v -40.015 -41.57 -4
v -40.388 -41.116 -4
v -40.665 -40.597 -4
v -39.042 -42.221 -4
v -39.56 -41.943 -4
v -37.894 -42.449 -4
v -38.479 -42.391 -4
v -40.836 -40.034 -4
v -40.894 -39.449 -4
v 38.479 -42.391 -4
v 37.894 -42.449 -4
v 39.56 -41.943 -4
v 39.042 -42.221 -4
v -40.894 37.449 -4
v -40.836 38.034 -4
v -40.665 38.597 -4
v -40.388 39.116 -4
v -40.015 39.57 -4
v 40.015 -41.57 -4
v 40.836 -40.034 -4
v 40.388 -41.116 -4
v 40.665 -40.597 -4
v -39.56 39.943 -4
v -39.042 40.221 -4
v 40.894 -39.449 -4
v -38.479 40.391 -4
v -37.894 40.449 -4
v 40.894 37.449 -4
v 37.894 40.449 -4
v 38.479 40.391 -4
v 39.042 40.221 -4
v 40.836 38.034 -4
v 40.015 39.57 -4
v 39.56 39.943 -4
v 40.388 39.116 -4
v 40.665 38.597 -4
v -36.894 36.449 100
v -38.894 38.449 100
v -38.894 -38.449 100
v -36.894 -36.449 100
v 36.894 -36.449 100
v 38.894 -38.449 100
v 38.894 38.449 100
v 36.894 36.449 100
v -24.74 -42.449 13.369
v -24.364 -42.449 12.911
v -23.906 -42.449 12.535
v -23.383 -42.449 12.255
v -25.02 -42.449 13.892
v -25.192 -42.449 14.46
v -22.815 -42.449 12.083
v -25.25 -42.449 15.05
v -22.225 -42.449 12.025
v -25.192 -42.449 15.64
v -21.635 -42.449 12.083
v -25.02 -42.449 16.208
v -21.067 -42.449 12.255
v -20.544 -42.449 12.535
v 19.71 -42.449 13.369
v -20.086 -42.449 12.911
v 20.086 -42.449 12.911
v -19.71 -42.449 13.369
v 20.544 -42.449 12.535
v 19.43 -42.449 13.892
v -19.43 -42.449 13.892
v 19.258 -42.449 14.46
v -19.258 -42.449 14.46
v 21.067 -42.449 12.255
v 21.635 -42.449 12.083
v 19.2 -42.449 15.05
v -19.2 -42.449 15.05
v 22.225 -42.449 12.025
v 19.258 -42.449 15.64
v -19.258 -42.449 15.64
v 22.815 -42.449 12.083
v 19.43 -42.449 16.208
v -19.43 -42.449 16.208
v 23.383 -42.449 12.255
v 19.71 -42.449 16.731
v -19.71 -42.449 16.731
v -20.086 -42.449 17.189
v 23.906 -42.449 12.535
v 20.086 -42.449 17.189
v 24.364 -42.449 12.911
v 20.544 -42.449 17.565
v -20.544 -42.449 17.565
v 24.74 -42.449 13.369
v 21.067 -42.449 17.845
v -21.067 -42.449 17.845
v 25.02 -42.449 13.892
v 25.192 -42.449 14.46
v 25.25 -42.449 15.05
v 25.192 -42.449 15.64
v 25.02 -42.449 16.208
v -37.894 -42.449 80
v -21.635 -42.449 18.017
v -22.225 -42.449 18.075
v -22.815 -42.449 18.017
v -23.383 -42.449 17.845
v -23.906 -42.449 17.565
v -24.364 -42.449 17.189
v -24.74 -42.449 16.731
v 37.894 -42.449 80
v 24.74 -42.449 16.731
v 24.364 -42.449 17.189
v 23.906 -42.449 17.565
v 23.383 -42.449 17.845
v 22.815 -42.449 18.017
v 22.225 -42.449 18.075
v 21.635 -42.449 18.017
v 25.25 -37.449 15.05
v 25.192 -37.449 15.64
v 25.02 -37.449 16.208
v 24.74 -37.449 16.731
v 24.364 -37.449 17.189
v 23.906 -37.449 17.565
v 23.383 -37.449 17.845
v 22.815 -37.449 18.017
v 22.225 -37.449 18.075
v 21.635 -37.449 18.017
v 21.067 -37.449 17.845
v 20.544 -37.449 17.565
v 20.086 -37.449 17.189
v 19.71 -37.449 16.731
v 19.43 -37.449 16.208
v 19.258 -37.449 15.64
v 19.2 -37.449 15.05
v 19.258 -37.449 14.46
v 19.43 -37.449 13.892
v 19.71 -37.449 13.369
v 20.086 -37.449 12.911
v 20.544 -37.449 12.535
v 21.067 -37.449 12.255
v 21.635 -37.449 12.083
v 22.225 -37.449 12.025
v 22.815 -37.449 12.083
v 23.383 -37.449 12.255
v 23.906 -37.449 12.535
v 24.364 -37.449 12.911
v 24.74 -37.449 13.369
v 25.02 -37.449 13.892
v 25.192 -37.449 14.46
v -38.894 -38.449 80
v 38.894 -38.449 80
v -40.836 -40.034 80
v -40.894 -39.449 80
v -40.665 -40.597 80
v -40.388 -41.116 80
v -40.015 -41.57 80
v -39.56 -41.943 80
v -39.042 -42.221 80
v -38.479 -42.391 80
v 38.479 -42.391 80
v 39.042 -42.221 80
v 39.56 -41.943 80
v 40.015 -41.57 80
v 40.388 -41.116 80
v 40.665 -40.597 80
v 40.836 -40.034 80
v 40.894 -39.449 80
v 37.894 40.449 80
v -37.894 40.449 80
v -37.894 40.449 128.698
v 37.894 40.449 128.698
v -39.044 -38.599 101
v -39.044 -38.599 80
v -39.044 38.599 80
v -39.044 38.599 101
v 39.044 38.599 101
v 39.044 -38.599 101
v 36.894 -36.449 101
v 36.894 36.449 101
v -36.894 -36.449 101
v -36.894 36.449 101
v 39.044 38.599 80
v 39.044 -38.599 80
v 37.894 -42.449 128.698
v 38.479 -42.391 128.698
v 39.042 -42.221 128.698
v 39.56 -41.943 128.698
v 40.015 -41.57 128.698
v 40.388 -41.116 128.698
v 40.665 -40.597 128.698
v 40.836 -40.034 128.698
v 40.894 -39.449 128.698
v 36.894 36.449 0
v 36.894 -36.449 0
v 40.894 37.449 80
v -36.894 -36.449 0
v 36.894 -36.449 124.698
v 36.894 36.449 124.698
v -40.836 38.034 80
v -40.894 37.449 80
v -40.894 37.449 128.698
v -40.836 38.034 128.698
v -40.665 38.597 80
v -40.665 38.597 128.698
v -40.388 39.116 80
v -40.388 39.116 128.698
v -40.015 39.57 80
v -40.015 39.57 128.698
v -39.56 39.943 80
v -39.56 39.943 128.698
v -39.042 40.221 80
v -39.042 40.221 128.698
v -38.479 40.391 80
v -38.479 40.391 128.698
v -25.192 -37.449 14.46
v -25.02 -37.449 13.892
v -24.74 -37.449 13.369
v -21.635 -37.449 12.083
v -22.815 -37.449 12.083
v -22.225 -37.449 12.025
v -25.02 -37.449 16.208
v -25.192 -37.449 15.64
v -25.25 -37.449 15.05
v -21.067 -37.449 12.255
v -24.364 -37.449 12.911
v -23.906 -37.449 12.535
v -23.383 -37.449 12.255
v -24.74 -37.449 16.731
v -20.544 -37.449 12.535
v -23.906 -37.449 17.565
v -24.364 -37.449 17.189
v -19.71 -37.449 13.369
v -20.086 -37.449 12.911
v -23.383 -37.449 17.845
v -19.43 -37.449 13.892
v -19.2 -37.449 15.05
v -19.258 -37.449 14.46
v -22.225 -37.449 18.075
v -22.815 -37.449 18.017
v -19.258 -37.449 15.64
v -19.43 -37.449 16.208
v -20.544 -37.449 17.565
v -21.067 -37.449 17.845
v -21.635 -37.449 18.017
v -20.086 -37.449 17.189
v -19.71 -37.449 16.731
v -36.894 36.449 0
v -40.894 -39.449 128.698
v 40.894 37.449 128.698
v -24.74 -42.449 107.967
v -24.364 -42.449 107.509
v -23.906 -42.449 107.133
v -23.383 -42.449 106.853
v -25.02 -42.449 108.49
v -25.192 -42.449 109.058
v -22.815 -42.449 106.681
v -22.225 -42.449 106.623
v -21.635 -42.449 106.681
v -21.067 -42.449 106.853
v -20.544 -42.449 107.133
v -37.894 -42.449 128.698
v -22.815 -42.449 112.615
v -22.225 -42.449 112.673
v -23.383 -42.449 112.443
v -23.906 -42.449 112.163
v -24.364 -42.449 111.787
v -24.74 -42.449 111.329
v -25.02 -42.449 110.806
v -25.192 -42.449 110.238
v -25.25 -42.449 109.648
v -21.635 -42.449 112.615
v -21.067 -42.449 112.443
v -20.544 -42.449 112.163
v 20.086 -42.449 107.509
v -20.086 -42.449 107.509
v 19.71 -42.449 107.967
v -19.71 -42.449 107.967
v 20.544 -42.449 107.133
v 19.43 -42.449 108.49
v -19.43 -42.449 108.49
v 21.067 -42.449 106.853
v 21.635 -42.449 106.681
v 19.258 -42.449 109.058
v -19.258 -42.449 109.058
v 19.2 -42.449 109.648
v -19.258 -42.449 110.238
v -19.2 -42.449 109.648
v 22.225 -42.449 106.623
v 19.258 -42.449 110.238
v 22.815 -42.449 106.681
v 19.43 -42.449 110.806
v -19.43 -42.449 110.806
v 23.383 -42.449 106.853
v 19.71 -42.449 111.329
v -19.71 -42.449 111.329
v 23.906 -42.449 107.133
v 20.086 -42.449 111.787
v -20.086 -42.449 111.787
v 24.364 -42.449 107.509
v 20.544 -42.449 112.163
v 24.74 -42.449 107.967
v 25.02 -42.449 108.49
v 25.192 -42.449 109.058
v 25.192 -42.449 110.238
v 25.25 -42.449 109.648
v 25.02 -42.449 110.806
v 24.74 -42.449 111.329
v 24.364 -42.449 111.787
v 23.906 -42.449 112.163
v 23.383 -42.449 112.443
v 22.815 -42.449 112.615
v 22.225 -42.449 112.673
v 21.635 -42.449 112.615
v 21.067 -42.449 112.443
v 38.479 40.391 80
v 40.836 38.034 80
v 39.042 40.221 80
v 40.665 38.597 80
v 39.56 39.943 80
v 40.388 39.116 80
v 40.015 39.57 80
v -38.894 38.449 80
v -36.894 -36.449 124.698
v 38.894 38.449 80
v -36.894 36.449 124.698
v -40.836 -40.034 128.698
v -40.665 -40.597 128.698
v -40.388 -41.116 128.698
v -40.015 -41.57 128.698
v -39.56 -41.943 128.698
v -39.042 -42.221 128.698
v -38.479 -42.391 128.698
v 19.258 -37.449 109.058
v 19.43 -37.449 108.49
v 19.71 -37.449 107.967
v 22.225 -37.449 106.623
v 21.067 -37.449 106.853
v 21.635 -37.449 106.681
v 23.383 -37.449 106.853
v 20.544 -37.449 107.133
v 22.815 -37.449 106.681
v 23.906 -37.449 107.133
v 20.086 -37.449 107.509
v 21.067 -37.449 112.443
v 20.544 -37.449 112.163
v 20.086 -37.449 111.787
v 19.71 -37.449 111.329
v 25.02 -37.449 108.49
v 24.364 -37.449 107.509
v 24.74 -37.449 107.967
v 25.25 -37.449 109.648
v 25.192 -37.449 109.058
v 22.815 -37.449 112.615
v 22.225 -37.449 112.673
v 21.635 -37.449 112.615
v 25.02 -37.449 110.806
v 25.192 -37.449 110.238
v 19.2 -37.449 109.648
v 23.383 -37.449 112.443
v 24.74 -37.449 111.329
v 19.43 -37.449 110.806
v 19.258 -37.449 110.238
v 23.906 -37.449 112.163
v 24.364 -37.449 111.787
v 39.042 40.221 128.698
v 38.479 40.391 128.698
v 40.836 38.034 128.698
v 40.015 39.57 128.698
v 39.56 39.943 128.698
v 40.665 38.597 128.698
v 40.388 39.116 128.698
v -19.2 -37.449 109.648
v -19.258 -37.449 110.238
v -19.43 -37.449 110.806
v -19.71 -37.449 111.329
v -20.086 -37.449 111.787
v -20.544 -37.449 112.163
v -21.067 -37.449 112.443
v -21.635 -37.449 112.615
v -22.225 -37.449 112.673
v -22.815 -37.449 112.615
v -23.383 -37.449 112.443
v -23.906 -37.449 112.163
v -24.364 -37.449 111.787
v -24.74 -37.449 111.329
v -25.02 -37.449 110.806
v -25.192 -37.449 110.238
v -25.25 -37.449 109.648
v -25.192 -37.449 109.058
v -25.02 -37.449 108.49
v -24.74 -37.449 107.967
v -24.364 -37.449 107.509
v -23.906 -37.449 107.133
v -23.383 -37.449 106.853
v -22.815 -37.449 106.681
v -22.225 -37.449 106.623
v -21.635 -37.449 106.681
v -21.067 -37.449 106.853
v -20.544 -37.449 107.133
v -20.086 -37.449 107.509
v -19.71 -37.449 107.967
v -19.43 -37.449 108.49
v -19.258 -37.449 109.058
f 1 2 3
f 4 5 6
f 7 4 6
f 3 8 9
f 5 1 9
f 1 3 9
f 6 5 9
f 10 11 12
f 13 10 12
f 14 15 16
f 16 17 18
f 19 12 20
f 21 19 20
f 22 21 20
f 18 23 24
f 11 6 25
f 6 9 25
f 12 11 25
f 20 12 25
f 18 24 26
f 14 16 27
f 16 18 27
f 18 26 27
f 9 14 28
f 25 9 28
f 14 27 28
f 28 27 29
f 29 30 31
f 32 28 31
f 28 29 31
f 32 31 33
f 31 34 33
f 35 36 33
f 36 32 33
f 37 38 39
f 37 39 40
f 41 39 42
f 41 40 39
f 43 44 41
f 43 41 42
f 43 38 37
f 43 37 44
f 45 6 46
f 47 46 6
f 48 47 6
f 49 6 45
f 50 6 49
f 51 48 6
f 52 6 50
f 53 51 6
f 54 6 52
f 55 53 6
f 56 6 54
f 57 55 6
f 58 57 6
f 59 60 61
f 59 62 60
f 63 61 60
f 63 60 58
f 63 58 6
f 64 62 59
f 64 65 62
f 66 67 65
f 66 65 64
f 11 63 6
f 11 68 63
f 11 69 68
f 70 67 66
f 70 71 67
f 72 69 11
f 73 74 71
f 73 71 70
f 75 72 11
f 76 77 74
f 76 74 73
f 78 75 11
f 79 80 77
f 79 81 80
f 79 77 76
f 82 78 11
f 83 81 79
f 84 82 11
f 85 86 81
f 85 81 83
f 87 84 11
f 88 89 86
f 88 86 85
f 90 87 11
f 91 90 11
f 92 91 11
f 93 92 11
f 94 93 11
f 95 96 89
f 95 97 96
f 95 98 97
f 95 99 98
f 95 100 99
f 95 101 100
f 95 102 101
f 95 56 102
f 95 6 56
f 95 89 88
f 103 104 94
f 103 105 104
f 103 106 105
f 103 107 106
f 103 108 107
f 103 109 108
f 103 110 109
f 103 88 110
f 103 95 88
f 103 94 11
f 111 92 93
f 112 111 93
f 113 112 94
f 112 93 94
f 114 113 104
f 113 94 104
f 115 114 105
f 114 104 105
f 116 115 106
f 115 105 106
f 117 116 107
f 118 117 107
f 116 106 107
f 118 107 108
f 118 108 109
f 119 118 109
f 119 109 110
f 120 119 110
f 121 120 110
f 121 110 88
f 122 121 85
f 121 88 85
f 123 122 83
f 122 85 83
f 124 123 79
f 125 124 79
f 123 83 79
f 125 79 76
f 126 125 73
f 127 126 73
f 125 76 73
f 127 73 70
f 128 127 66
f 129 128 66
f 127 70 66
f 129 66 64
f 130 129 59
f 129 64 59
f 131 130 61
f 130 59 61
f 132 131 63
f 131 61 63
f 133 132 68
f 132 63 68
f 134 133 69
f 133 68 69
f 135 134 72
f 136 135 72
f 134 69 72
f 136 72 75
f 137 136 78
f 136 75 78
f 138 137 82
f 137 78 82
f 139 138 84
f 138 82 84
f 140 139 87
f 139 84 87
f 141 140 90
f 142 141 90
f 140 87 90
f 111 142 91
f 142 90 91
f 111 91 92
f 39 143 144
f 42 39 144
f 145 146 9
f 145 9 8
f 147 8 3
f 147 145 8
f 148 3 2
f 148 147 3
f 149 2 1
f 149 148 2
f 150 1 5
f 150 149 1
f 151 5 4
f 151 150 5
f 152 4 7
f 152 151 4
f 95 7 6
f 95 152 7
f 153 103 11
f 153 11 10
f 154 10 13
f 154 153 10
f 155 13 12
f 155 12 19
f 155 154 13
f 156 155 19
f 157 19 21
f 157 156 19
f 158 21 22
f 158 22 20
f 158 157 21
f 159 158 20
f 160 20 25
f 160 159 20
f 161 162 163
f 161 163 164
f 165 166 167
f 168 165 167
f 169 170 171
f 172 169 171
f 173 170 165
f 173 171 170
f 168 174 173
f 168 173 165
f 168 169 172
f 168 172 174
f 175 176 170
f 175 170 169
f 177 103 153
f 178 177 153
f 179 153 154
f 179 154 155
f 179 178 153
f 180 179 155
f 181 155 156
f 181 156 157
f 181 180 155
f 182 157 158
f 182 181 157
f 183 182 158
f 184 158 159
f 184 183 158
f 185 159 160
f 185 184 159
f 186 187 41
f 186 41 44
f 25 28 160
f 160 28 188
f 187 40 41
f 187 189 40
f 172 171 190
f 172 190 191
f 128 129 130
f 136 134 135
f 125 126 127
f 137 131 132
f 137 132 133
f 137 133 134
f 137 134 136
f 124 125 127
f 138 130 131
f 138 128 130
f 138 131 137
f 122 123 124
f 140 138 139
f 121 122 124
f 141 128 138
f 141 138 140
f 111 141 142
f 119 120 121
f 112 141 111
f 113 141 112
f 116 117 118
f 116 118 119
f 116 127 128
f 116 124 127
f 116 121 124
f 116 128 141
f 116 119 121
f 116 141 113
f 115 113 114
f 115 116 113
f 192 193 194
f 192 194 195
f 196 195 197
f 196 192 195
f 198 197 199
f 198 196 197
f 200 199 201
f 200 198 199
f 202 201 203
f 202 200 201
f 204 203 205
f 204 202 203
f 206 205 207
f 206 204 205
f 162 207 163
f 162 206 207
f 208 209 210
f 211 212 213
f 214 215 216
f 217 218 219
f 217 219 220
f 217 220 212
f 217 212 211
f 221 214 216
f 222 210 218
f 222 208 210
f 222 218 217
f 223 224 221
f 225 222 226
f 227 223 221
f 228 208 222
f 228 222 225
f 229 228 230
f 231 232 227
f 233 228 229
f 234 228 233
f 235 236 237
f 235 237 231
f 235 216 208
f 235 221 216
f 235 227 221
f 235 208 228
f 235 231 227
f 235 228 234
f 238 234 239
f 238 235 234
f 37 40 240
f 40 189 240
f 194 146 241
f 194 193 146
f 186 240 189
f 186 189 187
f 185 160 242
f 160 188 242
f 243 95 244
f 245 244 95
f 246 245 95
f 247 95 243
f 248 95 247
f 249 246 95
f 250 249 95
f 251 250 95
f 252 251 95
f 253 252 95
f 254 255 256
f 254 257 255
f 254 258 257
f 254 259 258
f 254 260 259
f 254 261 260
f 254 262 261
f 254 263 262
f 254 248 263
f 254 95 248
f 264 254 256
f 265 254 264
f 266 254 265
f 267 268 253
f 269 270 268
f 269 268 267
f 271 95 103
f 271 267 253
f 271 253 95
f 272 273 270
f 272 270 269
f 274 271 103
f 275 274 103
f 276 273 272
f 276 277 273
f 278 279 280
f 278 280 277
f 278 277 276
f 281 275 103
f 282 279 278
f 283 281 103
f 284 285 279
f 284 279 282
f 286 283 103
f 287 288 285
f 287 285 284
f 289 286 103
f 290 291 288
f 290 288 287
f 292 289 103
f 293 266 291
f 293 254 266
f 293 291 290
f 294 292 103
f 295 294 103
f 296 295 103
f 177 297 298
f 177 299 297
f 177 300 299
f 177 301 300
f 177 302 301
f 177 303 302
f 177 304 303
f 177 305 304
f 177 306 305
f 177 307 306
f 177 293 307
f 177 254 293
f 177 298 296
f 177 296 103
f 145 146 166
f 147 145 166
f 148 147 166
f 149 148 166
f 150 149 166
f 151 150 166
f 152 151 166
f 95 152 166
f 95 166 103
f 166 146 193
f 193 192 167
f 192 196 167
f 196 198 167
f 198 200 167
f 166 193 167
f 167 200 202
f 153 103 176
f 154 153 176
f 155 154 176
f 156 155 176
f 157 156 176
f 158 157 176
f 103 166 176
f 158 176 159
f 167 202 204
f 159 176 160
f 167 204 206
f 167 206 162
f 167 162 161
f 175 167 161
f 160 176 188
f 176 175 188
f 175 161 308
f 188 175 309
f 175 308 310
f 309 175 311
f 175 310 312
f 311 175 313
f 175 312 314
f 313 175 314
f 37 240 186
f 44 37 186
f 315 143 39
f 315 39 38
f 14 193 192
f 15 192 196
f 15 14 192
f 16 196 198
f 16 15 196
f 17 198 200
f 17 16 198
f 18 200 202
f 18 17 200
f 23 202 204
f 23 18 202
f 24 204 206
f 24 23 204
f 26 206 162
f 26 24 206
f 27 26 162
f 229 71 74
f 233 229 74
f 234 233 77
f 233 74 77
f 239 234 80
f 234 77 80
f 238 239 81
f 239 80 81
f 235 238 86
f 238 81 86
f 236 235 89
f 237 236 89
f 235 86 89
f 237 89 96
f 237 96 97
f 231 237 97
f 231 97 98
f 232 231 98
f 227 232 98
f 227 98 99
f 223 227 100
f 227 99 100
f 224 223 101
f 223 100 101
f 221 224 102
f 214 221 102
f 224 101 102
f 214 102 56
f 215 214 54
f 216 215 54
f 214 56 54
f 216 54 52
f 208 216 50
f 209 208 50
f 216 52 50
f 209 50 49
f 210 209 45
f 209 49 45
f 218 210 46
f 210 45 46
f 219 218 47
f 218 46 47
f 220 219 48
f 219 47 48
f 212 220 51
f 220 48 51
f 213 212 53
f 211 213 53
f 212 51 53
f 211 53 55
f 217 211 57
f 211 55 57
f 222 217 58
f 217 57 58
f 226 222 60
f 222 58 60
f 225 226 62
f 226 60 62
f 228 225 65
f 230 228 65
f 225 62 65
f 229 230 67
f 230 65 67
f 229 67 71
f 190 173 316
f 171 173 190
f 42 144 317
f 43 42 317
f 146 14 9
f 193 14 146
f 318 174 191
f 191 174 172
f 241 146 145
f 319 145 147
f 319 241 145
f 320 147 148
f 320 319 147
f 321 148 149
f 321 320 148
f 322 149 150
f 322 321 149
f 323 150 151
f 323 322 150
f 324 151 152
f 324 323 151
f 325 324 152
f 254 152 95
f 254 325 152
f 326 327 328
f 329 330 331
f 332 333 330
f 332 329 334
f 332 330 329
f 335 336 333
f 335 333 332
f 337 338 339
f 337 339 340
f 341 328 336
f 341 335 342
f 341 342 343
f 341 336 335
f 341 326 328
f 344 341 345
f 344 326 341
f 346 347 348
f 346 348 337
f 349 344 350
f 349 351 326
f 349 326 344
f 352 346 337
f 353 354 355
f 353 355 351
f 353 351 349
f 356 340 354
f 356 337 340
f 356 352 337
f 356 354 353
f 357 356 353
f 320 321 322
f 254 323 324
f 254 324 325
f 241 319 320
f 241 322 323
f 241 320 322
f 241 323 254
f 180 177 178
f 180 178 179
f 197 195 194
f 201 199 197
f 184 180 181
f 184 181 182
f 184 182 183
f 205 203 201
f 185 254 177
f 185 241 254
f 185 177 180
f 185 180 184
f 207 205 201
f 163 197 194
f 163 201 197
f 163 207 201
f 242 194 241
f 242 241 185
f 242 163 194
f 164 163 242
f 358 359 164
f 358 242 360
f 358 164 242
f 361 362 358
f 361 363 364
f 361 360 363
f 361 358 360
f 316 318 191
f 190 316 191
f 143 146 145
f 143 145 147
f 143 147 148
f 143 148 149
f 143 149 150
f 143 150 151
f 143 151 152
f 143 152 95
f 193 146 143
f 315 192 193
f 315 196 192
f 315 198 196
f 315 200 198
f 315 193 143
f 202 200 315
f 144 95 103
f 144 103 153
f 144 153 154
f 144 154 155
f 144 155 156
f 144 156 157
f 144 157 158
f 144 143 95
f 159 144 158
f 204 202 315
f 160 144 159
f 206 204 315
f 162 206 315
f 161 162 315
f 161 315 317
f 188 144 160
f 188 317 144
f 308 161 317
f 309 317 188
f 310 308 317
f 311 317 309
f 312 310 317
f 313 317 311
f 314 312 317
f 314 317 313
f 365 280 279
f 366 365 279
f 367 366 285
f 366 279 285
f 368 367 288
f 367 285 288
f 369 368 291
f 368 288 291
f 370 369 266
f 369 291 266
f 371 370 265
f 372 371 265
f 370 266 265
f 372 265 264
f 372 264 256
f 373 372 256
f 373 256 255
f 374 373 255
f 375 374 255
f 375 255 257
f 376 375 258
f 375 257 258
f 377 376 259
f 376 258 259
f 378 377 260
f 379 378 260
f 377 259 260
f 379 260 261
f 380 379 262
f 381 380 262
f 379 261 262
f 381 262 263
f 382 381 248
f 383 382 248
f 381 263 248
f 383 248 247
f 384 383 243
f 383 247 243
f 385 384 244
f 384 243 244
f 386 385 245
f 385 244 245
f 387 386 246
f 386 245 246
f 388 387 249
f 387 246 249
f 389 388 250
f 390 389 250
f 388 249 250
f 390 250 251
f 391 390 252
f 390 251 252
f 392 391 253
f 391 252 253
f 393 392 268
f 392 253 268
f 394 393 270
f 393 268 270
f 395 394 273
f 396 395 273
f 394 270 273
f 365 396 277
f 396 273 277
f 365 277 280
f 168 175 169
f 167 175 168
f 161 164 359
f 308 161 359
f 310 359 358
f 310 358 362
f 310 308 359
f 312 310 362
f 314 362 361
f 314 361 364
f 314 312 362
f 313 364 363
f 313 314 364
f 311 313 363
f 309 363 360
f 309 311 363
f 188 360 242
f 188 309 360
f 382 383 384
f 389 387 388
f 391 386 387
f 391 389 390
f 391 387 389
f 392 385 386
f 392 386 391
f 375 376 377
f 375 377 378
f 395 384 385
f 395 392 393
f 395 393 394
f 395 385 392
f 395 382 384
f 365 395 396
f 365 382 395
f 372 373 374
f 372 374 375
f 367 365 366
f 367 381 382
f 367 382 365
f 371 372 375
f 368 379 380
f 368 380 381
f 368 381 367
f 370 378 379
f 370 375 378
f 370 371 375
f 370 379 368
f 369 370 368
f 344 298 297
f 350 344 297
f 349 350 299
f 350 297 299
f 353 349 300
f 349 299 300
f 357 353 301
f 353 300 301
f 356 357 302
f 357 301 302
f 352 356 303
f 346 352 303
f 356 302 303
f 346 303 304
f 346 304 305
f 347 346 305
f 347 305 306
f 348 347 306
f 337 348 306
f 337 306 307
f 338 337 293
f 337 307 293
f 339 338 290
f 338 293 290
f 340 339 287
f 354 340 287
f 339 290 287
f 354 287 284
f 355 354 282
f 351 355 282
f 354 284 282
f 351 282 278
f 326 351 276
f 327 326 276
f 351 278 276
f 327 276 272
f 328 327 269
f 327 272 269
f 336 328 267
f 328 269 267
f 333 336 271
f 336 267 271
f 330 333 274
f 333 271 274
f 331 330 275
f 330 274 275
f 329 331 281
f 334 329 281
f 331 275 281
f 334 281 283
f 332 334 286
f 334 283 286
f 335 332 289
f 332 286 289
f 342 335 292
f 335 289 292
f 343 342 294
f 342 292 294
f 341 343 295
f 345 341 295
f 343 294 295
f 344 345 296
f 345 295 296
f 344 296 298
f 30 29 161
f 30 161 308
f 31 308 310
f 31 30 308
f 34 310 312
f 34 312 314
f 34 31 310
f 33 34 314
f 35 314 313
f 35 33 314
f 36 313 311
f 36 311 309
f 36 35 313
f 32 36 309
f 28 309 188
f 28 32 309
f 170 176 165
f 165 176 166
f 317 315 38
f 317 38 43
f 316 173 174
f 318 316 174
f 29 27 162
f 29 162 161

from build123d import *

# Parameters (mm, degrees)
SKETCH1_W           = 73.787
SKETCH1_H           = 72.898
BOSS_EXTRUDE1_DEPTH = 123.698
SHELL1_T            = 4
SKETCH2_W           = 81.787
SKETCH2_H           = 80.898
SKETCH2_W_2         = 73.787
SKETCH2_H_2         = 72.898
BOSS_EXTRUDE2_DEPTH = 1
SKETCH7_W           = 81.787
SKETCH7_H           = 80.898
BOSS_EXTRUDE5_DEPTH = 4
SKETCH3_W           = 81.787
SKETCH3_H           = 132.698
BOSS_EXTRUDE3_DEPTH = 2
SKETCH4_R           = 3.025
CUT_EXTRUDE2_DEPTH  = 5
FILLET1_R           = 3
SKETCH5_W           = 77.787
SKETCH5_H           = 76.898
SKETCH5_W_2         = 73.787
SKETCH5_H_2         = 72.898
BOSS_EXTRUDE4_DEPTH = 20
SKETCH6_W           = 78.087
SKETCH6_H           = 77.198
CUT_EXTRUDE3_DEPTH  = 21


with BuildPart() as part:
    # Sketch1 → Boss-Extrude1 (new body)
    with BuildSketch(Plane.XY):
        Rectangle(SKETCH1_W, SKETCH1_H)
    extrude(amount=BOSS_EXTRUDE1_DEPTH)

    # Shell1
    shell1_openings = [part.faces().sort_by_distance(p)[0] for p in [
        (0, 0, 123.698),
    ]]
    offset(amount=SHELL1_T, openings=shell1_openings, kind=Kind.INTERSECTION)

    # Sketch2 → Boss-Extrude2 (add)
    with BuildSketch(Plane.XY.offset(123.698)):
        Rectangle(SKETCH2_W, SKETCH2_H)
        Rectangle(SKETCH2_W_2, SKETCH2_H_2, mode=Mode.SUBTRACT)
    extrude(amount=BOSS_EXTRUDE2_DEPTH)

    # Sketch7 → Boss-Extrude5 (add)
    with BuildSketch(Plane.XY.offset(124.698)):
        Rectangle(SKETCH7_W, SKETCH7_H)
    extrude(amount=BOSS_EXTRUDE5_DEPTH)

    # Sketch3 → Boss-Extrude3 (add)
    with BuildSketch(Plane.XZ.offset(40.449)):
        with Locations((0, 62.349)):
            Rectangle(SKETCH3_W, SKETCH3_H)
    extrude(amount=BOSS_EXTRUDE3_DEPTH)

    # Sketch4 → Cut-Extrude2 (cut)
    with BuildSketch(Plane.XZ.offset(42.449)):
        with Locations((-22.225, 109.648)):
            Circle(SKETCH4_R)
        with Locations((22.225, 109.648)):
            Circle(SKETCH4_R)
        with Locations((-22.225, 15.05)):
            Circle(SKETCH4_R)
        with Locations((22.225, 15.05)):
            Circle(SKETCH4_R)
    extrude(amount=-CUT_EXTRUDE2_DEPTH, mode=Mode.SUBTRACT)

    # Fillet1
    fillet1_edges = [part.edges().sort_by_distance(p)[0] for p in [
        (-40.8935, -42.449, 62.349),
        (40.8935, -42.449, 62.349),
        (40.8935, 40.449, 62.349),
        (-40.8935, 40.449, 62.349),
    ]]
    fillet(fillet1_edges, radius=FILLET1_R)


with BuildPart() as body_2:
    # Split1: the piece on the far side of the plane
    add(part.part)
    split(bisect_by=Plane.XY.offset(80), keep=Keep.BOTTOM)

    # Sketch5 → Boss-Extrude4 (add)
    with BuildSketch(Plane.XY.offset(80)):
        Rectangle(SKETCH5_W, SKETCH5_H)
        Rectangle(SKETCH5_W_2, SKETCH5_H_2, mode=Mode.SUBTRACT)
    extrude(amount=BOSS_EXTRUDE4_DEPTH)


with BuildPart() as part_1:
    add(part.part)

    # Split1
    split(bisect_by=Plane.XY.offset(80), keep=Keep.TOP)

    # Sketch6 → Cut-Extrude3 (cut)
    with BuildSketch(Plane(origin=(0, 0, 80), x_dir=(-1, 0, 0), z_dir=(0, 0, -1))):
        Rectangle(SKETCH6_W, SKETCH6_H)
    extrude(amount=-CUT_EXTRUDE3_DEPTH, mode=Mode.SUBTRACT)


solid = Compound([body_2.part, part_1.part])
